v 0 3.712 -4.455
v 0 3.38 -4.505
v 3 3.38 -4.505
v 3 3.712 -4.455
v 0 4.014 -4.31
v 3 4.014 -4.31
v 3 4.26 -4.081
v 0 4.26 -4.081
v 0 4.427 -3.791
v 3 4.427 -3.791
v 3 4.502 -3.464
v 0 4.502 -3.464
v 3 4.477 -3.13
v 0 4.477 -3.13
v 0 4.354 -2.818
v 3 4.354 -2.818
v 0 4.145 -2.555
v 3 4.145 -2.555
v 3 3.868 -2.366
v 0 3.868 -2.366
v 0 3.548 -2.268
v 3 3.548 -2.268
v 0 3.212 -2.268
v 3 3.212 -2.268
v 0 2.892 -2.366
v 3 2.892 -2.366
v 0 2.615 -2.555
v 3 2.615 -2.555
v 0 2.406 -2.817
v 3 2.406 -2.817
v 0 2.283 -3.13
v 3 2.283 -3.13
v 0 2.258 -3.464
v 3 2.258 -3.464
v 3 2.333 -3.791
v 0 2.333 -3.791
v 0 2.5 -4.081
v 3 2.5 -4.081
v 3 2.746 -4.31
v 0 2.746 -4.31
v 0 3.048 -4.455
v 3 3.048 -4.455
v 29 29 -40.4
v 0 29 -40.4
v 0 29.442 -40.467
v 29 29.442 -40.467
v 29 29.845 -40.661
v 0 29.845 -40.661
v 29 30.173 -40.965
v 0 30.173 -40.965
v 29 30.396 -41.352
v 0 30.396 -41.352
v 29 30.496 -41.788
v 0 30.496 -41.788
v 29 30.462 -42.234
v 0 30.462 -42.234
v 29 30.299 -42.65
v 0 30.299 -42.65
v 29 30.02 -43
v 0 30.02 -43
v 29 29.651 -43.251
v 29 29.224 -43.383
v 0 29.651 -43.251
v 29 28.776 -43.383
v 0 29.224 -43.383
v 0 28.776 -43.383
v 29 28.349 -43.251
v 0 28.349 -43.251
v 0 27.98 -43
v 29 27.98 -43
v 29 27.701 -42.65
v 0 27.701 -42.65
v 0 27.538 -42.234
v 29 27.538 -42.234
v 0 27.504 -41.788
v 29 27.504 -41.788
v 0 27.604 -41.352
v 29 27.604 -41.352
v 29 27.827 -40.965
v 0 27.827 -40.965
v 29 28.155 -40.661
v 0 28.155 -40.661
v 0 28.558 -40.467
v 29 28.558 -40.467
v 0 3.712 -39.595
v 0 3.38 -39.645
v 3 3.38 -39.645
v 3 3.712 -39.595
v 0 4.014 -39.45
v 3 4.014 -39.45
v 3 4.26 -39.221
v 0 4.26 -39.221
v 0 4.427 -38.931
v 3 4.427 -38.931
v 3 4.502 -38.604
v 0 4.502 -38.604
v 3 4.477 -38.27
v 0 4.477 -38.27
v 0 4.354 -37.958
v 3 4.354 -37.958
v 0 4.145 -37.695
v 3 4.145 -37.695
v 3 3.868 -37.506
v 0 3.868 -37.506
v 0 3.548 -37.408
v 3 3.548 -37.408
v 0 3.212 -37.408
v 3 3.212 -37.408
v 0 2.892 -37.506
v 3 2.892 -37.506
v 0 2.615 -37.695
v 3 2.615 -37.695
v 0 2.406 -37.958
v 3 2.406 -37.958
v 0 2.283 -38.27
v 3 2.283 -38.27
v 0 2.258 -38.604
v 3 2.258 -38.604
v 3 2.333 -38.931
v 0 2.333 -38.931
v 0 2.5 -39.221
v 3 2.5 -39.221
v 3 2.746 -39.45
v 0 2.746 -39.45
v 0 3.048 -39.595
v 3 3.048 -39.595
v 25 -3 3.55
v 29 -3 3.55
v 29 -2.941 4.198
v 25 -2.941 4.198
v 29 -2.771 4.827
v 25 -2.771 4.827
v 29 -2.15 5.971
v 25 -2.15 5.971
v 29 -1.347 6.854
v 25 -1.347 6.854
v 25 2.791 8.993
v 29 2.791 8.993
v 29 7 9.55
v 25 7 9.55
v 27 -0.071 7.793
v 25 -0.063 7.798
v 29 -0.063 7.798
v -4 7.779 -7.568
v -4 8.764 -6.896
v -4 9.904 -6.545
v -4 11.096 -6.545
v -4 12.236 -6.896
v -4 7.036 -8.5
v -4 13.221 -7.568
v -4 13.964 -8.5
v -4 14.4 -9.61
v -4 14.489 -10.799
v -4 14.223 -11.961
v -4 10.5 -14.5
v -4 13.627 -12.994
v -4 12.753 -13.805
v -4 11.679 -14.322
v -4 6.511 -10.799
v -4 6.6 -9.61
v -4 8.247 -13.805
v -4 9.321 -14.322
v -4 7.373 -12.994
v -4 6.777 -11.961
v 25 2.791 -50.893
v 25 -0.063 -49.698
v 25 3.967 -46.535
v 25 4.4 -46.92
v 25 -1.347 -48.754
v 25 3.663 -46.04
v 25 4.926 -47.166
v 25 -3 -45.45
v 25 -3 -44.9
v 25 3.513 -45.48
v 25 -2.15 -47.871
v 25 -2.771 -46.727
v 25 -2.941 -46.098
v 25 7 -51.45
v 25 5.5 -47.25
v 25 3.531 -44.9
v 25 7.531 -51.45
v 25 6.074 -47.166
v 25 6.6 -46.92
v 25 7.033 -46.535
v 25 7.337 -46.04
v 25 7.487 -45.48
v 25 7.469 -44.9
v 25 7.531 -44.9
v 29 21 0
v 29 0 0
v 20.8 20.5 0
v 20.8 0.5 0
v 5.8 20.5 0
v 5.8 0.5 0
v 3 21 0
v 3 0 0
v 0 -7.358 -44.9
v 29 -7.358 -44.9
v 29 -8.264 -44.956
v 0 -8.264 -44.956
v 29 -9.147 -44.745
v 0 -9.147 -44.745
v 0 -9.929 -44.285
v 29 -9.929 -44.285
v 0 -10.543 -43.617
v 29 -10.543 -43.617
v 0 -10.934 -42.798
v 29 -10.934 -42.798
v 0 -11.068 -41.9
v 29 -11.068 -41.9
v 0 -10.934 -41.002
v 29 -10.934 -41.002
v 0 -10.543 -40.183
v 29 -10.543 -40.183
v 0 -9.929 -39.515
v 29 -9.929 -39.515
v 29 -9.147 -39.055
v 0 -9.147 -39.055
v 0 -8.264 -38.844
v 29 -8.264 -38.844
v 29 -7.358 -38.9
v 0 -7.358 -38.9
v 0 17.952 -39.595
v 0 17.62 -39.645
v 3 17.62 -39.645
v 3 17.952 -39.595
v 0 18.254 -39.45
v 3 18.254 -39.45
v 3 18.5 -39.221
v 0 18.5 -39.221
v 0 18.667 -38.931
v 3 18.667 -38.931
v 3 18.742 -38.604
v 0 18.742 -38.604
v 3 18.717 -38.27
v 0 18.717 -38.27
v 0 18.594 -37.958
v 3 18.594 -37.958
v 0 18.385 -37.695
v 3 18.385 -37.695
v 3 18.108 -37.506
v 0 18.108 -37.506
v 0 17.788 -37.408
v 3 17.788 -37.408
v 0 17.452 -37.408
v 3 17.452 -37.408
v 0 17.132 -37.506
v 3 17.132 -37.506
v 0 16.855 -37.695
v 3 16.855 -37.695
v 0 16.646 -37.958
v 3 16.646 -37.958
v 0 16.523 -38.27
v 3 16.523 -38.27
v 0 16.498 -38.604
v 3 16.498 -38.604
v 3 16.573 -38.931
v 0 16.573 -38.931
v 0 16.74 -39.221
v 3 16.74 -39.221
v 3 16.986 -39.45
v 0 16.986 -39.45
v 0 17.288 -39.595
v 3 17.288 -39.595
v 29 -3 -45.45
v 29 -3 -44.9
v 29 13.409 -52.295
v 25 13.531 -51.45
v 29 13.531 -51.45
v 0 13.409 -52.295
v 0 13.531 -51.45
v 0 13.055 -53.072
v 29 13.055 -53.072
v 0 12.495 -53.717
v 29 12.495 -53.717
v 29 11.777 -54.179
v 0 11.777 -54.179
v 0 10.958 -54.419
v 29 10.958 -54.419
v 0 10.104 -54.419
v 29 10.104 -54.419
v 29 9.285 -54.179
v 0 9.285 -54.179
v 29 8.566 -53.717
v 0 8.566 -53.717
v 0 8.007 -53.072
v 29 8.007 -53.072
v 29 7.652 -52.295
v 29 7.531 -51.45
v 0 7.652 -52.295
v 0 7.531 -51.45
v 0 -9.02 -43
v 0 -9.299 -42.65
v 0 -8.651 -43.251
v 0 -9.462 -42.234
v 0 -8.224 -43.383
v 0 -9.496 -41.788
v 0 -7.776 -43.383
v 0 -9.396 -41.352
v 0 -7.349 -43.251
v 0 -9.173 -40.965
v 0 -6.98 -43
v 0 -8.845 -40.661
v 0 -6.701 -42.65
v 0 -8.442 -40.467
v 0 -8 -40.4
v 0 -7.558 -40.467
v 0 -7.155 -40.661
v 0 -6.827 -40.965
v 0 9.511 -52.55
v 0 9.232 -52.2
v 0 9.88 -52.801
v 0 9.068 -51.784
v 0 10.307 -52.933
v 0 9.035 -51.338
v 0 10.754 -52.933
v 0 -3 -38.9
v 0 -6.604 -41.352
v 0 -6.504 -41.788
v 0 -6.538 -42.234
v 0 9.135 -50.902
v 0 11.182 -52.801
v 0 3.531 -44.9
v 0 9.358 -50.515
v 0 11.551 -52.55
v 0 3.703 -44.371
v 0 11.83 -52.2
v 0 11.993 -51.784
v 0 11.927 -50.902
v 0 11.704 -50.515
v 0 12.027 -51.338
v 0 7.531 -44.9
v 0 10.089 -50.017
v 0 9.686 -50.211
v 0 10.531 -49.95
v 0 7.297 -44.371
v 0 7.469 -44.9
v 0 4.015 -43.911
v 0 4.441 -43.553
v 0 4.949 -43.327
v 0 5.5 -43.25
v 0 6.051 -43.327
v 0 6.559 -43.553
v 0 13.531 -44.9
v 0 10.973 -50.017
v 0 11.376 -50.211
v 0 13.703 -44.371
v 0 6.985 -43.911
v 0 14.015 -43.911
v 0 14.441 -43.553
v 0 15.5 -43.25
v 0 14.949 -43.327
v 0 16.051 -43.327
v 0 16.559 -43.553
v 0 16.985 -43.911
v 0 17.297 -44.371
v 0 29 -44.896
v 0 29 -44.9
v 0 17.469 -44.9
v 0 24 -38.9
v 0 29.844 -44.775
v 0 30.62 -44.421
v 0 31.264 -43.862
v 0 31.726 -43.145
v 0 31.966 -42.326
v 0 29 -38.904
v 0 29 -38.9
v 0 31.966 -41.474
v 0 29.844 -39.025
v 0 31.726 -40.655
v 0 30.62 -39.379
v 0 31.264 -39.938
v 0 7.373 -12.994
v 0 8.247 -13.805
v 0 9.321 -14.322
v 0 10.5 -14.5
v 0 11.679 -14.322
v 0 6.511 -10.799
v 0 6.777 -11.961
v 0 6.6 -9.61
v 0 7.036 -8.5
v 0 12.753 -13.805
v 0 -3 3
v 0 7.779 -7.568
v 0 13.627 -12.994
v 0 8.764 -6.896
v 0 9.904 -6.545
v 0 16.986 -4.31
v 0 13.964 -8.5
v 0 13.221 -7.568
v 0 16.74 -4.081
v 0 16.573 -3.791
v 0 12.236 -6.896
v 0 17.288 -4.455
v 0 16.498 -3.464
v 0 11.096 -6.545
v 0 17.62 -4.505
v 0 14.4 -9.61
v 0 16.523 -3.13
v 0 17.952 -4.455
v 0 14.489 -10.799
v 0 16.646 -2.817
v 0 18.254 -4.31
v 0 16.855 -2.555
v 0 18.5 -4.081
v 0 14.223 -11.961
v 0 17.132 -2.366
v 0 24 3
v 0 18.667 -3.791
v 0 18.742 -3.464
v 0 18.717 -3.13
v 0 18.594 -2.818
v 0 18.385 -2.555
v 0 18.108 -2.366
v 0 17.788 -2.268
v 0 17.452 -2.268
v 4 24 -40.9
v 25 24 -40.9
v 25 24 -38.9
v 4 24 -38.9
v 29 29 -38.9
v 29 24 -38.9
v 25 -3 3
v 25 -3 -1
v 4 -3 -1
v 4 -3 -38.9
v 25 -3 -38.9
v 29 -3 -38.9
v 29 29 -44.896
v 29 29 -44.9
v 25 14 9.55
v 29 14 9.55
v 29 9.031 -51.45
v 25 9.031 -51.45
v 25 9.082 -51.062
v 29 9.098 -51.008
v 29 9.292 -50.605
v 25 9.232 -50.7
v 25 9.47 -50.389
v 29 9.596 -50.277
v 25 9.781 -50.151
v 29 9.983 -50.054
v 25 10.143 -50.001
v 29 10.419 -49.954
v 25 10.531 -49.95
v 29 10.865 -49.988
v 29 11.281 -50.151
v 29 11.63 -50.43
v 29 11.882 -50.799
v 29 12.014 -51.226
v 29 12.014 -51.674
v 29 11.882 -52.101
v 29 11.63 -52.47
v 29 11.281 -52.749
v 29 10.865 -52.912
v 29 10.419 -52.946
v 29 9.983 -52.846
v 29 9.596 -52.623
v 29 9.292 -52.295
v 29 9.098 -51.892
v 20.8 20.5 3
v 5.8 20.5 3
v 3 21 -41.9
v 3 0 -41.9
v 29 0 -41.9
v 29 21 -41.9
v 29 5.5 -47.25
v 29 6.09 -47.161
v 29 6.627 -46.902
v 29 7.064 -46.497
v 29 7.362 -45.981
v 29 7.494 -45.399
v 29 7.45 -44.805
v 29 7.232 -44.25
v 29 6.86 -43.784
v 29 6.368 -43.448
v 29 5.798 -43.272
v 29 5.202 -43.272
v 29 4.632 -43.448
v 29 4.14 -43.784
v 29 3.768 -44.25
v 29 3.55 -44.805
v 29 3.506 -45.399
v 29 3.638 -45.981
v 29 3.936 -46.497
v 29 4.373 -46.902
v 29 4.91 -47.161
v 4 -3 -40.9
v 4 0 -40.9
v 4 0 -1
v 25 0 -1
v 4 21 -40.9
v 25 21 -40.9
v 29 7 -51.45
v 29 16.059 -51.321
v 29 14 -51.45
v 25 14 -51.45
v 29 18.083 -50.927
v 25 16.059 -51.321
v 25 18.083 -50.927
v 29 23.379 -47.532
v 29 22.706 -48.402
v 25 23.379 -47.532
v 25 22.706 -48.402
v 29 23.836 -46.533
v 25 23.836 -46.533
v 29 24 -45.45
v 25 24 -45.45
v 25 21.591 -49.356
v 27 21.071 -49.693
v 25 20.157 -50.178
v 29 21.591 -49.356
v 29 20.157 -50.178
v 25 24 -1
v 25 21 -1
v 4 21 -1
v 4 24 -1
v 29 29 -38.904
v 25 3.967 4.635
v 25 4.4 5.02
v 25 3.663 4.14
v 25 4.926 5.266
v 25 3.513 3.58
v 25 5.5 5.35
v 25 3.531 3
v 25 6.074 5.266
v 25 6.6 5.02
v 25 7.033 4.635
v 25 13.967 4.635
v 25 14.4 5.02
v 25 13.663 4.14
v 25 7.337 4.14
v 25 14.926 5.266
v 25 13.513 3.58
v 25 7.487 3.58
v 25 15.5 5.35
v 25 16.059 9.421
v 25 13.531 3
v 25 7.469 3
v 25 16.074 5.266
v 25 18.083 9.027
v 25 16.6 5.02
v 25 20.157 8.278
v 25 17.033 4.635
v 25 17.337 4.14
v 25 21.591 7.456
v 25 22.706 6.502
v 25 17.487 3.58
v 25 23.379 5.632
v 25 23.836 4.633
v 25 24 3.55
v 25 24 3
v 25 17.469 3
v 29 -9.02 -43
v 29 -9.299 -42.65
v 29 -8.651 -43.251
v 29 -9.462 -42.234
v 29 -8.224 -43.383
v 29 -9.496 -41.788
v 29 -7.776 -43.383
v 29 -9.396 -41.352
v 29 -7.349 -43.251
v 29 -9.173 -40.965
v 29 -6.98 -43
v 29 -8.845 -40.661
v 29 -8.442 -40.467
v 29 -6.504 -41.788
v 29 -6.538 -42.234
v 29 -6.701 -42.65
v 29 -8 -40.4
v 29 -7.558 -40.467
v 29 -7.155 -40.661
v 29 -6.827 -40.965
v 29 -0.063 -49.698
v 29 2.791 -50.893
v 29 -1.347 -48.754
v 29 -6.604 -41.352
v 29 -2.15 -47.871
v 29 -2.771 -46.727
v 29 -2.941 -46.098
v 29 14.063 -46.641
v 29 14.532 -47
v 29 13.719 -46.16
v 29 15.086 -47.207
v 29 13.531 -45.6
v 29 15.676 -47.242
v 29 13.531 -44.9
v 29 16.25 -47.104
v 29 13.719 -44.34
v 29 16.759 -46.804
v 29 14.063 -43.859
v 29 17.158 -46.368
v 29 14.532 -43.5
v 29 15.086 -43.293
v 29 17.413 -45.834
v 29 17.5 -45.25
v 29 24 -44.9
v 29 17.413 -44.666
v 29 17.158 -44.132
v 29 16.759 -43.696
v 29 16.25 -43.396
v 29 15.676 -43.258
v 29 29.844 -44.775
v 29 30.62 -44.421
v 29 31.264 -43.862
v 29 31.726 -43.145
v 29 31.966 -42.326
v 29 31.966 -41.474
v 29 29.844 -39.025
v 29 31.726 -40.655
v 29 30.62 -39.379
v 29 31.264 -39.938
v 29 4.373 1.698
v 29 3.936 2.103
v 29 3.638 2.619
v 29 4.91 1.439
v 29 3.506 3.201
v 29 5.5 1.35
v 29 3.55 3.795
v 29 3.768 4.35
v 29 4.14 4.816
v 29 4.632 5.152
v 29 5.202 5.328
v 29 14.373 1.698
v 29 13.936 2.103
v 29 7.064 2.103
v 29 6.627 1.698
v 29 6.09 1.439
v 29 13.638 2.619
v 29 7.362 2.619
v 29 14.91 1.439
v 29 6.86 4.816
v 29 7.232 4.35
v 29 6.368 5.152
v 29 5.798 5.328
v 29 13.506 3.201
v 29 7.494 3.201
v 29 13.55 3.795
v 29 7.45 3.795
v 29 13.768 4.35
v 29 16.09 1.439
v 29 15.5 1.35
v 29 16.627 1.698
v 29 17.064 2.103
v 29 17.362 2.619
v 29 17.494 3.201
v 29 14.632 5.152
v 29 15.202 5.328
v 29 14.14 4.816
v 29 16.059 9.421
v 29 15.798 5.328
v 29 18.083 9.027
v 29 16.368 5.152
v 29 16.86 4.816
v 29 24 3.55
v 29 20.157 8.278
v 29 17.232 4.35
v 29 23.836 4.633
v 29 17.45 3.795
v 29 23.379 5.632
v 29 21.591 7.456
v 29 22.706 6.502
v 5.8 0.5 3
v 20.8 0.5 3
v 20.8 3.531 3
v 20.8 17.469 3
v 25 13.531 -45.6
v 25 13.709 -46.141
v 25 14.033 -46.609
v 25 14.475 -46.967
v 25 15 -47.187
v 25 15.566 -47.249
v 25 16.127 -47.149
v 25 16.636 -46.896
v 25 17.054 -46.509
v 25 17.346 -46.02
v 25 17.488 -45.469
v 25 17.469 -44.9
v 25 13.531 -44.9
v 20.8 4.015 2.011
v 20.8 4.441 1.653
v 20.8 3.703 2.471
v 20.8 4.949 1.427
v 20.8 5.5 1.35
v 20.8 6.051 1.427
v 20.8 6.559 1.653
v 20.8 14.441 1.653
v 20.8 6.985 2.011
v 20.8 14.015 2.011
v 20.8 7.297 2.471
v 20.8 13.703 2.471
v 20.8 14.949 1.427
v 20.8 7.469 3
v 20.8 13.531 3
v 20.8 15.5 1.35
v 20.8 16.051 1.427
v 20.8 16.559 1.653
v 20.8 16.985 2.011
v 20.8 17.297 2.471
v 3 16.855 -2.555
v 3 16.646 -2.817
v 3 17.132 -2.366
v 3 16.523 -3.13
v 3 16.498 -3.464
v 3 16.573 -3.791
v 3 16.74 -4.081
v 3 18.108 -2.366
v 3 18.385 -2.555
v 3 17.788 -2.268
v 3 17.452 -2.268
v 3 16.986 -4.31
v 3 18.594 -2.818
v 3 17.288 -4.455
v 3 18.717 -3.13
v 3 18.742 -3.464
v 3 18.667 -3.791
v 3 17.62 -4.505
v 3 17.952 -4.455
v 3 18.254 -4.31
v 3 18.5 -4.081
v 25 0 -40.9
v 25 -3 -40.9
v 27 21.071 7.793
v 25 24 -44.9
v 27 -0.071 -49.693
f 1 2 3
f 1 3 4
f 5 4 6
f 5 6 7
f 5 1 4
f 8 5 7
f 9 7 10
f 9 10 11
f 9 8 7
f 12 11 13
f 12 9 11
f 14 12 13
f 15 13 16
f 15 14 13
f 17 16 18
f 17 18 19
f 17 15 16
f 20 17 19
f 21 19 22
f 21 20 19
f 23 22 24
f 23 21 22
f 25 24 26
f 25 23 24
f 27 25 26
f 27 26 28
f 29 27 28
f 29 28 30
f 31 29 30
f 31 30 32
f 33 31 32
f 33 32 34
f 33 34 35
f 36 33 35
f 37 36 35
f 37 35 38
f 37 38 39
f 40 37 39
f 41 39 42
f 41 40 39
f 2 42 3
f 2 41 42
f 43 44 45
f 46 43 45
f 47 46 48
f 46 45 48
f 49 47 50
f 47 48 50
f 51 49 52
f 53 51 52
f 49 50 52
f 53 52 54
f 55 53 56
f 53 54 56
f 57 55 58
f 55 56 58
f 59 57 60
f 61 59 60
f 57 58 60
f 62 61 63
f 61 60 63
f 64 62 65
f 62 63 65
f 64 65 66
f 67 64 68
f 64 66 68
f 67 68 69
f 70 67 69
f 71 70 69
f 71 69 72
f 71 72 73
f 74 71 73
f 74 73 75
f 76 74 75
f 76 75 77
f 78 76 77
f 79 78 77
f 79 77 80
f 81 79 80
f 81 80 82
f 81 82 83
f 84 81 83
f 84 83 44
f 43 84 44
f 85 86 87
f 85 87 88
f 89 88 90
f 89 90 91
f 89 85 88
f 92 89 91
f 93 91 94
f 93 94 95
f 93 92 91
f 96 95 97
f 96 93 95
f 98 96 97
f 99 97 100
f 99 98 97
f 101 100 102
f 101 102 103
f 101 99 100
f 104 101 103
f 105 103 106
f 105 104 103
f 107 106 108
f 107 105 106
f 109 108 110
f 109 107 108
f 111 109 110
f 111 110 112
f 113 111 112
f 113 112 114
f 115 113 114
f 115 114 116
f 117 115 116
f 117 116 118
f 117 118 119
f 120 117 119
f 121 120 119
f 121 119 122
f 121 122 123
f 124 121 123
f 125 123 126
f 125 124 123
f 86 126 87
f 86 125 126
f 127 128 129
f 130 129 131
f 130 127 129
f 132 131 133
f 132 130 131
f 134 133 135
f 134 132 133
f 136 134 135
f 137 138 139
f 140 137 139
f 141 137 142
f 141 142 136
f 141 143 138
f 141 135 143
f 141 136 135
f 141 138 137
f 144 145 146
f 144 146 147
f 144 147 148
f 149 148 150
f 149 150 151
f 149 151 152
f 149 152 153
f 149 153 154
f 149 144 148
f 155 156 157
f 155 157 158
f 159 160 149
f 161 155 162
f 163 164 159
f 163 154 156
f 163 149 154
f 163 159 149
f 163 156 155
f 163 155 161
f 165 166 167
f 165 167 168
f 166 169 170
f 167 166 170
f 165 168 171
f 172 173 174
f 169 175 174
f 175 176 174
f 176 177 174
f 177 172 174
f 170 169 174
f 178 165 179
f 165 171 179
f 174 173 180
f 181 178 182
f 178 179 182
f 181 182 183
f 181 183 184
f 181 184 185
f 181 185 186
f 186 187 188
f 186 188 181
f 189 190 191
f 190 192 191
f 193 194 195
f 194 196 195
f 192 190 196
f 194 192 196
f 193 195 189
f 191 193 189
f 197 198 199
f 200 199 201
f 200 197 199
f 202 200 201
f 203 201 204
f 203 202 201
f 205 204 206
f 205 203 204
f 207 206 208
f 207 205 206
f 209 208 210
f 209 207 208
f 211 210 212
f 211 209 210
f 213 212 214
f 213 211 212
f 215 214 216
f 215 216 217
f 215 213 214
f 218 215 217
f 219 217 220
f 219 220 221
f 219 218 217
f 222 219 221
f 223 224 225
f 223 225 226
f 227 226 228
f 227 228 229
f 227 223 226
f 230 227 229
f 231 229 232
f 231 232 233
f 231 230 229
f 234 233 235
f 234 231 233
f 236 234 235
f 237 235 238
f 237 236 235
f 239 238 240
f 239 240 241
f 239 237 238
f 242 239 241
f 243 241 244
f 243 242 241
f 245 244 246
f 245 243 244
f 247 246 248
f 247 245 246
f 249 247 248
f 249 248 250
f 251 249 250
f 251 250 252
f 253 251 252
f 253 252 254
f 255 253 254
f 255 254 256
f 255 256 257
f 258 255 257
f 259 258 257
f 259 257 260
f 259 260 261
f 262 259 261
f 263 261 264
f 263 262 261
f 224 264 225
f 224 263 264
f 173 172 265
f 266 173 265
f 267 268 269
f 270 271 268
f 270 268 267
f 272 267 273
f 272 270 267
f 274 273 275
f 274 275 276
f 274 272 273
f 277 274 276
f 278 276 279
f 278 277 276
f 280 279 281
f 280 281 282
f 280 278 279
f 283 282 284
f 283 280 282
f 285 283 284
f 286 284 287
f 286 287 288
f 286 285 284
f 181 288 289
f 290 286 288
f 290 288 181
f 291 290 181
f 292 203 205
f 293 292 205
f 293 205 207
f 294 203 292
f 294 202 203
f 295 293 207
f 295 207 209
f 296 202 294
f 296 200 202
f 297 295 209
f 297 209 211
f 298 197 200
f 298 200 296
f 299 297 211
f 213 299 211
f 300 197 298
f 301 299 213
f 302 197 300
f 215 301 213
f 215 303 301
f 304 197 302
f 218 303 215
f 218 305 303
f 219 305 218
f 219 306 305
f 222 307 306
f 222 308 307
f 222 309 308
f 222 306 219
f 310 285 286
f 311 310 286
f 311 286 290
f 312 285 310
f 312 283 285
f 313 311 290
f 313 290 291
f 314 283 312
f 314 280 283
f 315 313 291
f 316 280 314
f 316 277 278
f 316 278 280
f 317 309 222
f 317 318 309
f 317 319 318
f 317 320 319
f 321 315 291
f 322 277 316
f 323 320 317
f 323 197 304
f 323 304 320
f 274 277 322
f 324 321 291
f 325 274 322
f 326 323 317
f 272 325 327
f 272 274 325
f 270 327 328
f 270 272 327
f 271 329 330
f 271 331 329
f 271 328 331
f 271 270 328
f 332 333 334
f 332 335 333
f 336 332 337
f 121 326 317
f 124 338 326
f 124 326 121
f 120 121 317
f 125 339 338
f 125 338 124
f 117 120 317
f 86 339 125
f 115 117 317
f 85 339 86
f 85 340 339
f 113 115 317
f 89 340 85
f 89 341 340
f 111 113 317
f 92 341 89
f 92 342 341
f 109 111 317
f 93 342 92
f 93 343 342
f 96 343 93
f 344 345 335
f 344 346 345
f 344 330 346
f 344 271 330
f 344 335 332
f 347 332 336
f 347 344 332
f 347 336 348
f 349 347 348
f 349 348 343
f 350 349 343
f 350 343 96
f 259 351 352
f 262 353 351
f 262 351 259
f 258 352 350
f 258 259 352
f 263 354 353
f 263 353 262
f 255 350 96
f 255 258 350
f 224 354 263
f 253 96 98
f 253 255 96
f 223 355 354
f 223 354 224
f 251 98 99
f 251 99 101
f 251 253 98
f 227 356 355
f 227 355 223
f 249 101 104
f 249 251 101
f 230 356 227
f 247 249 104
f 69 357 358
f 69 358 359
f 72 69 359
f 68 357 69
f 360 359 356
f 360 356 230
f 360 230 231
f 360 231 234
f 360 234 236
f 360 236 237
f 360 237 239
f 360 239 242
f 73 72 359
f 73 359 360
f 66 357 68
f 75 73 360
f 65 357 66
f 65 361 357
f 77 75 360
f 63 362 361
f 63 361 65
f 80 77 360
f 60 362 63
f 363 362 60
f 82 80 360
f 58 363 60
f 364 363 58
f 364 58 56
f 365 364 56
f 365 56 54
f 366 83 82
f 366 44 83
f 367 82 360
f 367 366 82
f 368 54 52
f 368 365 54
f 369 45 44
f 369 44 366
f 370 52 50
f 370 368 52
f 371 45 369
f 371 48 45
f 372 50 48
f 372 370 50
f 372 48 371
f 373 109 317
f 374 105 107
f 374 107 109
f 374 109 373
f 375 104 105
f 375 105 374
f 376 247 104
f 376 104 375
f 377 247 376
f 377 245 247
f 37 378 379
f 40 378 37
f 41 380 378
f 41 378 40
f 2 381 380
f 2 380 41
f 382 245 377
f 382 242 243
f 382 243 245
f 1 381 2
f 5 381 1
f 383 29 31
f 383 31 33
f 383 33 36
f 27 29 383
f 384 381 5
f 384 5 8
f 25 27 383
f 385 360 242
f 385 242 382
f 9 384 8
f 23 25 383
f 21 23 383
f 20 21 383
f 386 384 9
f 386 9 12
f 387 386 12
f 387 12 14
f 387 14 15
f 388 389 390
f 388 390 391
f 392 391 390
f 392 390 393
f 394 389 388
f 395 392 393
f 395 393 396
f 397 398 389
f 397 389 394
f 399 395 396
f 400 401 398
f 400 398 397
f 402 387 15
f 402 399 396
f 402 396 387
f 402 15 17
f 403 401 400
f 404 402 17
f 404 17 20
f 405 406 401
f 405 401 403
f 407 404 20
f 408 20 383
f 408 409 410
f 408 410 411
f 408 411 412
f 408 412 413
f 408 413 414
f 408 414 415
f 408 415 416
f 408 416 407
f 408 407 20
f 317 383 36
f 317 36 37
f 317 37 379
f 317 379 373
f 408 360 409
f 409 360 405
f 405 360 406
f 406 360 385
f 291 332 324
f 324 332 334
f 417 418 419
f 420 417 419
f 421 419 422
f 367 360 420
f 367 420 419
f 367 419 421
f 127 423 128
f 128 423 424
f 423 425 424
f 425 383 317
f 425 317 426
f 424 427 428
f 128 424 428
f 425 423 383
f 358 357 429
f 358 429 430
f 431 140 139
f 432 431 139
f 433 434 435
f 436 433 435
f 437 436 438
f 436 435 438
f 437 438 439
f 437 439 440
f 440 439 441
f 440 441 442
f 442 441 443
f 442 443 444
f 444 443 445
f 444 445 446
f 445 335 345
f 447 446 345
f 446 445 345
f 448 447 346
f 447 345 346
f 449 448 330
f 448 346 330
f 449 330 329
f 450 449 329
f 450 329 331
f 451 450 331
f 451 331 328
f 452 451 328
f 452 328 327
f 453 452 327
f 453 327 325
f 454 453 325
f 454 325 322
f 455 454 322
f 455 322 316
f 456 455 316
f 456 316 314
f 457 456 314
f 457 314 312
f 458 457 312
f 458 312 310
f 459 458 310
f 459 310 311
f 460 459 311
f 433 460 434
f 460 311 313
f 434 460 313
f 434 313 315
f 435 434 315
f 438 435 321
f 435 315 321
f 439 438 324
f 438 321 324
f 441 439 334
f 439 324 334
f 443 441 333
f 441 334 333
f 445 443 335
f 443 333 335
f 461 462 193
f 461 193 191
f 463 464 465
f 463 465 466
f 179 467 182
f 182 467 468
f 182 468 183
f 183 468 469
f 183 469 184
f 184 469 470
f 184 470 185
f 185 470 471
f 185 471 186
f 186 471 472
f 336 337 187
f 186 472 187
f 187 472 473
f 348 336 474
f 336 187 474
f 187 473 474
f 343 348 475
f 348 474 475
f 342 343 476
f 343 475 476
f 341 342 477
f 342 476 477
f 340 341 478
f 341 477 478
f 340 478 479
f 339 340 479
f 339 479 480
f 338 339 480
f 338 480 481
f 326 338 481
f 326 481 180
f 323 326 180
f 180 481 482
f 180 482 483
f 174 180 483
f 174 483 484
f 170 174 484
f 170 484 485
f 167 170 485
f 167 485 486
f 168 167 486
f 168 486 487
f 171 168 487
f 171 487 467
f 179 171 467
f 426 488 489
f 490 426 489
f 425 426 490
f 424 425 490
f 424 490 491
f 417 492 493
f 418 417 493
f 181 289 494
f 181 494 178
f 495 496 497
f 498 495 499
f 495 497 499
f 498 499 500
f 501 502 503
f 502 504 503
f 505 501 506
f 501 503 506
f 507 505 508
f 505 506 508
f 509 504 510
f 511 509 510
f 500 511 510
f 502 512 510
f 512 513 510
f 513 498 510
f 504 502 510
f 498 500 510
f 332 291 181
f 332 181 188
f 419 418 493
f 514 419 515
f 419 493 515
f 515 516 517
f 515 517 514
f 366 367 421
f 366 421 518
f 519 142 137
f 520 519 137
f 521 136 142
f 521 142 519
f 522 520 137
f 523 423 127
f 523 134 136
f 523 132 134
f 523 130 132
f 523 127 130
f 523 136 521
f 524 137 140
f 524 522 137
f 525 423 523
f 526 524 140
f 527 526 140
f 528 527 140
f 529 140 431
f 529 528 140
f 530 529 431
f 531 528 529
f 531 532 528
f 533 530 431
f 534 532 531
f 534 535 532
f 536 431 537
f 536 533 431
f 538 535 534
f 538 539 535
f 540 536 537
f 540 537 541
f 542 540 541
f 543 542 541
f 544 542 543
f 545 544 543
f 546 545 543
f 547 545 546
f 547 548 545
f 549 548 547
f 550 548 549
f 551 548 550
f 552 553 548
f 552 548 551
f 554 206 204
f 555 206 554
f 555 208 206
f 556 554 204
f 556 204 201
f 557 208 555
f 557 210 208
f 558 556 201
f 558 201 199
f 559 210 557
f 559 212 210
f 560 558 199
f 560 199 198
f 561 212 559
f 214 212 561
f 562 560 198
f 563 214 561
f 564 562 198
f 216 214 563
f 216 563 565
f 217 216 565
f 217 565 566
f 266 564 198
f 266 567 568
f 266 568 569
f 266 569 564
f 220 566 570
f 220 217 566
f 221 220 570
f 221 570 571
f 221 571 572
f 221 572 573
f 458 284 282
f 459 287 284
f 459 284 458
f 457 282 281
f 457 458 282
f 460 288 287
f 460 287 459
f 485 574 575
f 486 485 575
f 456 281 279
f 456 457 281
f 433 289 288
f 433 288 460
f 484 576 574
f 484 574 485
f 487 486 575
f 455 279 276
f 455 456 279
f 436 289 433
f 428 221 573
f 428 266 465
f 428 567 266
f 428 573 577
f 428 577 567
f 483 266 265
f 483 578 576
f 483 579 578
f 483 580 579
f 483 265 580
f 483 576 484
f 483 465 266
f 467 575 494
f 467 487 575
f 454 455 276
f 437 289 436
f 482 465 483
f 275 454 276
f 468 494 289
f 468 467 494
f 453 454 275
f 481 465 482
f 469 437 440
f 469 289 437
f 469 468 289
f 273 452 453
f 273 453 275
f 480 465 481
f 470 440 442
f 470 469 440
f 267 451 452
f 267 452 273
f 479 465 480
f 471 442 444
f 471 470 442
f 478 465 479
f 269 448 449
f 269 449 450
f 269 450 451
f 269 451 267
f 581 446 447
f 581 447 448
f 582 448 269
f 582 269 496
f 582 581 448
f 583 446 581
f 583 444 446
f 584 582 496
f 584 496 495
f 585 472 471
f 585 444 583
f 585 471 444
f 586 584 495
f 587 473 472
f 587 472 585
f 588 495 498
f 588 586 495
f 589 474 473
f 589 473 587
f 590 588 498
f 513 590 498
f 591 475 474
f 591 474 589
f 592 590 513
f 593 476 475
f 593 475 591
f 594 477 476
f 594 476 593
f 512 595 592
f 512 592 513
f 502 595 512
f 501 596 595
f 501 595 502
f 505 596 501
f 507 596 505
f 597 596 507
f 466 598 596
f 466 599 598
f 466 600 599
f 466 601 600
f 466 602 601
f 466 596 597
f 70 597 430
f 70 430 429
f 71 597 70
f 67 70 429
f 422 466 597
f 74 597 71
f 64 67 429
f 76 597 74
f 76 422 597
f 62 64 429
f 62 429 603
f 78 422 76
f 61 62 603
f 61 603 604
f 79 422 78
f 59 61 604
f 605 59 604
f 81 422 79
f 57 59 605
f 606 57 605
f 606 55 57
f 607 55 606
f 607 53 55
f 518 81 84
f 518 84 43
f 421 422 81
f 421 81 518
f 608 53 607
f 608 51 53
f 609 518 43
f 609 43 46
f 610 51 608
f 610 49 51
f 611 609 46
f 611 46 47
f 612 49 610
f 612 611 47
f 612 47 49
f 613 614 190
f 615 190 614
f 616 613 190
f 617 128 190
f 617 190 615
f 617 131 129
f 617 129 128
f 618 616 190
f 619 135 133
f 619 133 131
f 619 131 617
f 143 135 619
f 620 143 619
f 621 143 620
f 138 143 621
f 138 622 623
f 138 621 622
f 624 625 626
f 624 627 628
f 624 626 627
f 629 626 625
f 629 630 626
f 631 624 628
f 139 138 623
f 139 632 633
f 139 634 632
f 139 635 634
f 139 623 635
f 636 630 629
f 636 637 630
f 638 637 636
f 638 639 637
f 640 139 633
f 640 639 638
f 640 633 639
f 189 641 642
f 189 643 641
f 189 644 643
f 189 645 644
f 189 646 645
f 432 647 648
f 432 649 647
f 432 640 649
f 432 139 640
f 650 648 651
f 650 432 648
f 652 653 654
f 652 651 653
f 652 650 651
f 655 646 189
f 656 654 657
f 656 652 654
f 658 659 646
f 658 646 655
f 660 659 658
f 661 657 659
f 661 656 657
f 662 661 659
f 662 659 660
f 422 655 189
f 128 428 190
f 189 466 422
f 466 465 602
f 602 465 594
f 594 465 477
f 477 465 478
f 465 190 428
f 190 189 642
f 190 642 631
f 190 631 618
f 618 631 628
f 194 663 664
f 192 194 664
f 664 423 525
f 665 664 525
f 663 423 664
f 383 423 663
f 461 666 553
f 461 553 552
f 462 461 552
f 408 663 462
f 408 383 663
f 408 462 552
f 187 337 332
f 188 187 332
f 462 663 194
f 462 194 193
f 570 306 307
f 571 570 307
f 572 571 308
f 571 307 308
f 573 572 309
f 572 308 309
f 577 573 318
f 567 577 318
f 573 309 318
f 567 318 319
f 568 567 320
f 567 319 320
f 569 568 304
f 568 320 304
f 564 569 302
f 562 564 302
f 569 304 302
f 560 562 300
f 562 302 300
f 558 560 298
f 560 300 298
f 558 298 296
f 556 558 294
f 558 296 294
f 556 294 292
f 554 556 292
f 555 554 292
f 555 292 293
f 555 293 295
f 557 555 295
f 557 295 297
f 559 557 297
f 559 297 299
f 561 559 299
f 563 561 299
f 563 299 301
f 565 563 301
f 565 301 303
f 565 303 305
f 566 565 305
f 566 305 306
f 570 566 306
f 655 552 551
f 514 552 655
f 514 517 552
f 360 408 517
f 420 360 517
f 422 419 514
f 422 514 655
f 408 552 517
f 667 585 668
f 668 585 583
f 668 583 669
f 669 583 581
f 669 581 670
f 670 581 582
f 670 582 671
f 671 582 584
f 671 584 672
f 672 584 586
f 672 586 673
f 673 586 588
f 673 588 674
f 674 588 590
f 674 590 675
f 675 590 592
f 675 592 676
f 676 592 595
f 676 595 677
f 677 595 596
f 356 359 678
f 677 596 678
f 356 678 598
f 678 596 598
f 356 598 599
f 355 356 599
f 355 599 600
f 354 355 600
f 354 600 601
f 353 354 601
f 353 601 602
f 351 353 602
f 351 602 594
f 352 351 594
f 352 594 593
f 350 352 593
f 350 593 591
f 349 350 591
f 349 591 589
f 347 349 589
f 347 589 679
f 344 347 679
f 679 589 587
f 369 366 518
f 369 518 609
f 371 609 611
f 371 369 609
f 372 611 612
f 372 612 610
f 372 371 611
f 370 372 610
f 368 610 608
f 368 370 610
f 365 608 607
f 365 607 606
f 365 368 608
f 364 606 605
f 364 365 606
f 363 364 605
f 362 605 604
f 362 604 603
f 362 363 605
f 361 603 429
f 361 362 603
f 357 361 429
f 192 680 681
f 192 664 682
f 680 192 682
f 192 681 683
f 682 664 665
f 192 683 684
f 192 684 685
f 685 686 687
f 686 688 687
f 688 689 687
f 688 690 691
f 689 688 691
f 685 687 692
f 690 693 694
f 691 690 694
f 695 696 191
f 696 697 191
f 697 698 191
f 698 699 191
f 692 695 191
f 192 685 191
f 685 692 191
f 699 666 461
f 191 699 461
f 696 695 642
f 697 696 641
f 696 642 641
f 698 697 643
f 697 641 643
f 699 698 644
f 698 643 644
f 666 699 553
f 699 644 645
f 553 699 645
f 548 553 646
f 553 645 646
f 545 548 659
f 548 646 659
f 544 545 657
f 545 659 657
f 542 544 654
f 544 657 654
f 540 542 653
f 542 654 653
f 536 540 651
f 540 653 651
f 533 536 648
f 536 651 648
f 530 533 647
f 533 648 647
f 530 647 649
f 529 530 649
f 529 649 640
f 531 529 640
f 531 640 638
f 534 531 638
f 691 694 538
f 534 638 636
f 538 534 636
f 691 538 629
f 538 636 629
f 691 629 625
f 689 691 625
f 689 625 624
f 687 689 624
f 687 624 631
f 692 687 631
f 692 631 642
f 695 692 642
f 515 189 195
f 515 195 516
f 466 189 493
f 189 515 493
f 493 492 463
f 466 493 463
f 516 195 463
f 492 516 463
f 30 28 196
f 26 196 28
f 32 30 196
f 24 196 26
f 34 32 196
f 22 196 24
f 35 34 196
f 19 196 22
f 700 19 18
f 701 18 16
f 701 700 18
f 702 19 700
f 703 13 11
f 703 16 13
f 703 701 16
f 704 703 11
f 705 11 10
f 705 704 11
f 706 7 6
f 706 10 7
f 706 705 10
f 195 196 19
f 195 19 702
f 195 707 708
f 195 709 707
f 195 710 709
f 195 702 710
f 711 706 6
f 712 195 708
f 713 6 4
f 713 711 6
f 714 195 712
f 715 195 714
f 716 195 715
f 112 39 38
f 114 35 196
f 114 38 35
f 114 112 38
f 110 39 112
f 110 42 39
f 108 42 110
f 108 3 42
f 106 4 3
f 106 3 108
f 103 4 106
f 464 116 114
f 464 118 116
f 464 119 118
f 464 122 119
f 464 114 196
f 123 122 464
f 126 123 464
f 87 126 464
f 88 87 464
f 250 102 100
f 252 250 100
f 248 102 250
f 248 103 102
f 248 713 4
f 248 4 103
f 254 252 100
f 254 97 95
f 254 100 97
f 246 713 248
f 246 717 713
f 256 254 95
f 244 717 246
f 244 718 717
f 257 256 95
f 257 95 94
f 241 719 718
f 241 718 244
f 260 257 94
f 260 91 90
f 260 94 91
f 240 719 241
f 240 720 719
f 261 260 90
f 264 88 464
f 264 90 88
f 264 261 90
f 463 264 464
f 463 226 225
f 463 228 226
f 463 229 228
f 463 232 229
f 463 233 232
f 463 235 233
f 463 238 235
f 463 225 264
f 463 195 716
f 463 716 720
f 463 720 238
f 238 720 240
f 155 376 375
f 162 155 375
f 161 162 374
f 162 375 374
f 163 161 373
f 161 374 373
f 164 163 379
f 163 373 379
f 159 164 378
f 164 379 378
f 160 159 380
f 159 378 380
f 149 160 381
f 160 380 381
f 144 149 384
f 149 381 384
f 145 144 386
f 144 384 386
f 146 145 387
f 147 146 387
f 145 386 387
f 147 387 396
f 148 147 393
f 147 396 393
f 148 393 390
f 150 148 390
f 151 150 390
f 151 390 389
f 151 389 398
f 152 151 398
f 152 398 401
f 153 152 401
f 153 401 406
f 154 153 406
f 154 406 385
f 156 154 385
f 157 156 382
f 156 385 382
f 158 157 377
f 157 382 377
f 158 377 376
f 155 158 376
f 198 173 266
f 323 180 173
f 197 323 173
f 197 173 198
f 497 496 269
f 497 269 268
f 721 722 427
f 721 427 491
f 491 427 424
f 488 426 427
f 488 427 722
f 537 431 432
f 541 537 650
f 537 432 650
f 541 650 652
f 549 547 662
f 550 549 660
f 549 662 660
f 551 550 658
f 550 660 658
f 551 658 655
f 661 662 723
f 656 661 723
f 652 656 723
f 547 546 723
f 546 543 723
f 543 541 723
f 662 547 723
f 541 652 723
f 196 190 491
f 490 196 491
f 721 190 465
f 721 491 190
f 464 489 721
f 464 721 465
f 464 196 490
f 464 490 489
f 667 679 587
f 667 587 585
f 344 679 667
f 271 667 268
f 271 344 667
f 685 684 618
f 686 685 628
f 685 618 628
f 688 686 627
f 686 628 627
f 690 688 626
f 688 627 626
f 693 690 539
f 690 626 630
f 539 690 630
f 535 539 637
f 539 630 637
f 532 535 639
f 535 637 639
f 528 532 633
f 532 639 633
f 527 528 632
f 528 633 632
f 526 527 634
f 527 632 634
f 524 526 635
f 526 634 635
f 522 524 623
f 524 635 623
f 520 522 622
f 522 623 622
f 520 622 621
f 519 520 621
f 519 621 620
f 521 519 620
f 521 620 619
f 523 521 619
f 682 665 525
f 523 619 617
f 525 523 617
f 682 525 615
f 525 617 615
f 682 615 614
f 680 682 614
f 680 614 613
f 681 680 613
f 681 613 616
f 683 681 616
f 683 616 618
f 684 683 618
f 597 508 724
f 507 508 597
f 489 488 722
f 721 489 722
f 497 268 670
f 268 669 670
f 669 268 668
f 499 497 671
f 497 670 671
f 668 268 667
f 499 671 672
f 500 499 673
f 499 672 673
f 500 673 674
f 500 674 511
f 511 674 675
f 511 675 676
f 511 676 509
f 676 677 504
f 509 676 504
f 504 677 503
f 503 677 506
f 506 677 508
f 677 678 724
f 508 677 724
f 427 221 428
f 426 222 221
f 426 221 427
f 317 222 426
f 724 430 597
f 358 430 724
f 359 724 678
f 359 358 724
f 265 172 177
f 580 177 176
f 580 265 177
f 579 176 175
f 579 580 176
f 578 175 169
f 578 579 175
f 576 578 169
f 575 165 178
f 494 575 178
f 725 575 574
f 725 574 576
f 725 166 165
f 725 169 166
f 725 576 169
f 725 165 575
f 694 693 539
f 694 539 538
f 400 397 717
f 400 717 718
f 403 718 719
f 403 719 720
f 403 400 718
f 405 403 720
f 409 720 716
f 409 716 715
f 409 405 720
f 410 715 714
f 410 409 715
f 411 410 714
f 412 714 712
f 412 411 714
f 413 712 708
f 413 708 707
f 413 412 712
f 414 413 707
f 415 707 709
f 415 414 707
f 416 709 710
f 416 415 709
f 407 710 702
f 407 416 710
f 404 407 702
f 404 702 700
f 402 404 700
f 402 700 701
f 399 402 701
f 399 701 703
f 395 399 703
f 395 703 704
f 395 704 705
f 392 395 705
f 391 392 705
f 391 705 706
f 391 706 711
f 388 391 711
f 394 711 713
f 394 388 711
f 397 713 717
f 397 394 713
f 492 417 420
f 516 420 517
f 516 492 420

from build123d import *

# Parameters (mm, degrees)
SKETCH1_W            = 41.9
SKETCH1_H            = 21
SKETCH1_R            = 1.125
BOSS_EXTRUDE1_DEPTH  = 3
SKETCH1_3_W          = 47.9
SKETCH1_3_H          = 27
SKETCH1_3_W_2        = 41.9
SKETCH1_3_H_2        = 21
BOSS_EXTRUDE2_DEPTH  = 29
CUT_EXTRUDE1_REACH   = 62.921
SKETCH2_W            = 15
SKETCH2_H            = 20
SKETCH4_W            = 21
SKETCH4_H            = 39.9
CUT_EXTRUDE2_DEPTH   = 35
SKETCH5_R            = 4
BOSS_EXTRUDE3_DEPTH  = 4
SKETCH6_W            = 4
SKETCH6_H            = 27
BOSS_EXTRUDE4_DEPTH  = 6.55
SKETCH7_W            = 4
SKETCH7_H            = 27
BOSS_EXTRUDE5_DEPTH  = 6.55
CUT_EXTRUDE3_REACH   = 67.667
SKETCH10_R           = 2
BOSS_EXTRUDE10_REACH = 65.75
SKETCH11_R           = 1.5
FILLET3_SIZE         = 10
FILLET3_SIZE_2       = 6
CUT_EXTRUDE4_REACH   = 73.257
SKETCH12_R           = 1.5


with BuildPart() as part:
    # Sketch1 → Boss-Extrude1 (new body)
    with BuildSketch(Plane(origin=(0, 0, 0), x_dir=(0, 0, -1), z_dir=(1, 0, 0))):
        with Locations((20.95, 10.5)):
            Rectangle(SKETCH1_W, SKETCH1_H)
        with Locations((38.52, 17.62)):
            Circle(SKETCH1_R, mode=Mode.SUBTRACT)
        with Locations((38.52, 3.38)):
            Circle(SKETCH1_R, mode=Mode.SUBTRACT)
        with Locations((3.38, 17.62)):
            Circle(SKETCH1_R, mode=Mode.SUBTRACT)
        with Locations((3.38, 3.38)):
            Circle(SKETCH1_R, mode=Mode.SUBTRACT)
    extrude(amount=BOSS_EXTRUDE1_DEPTH)

    # Sketch1<3> → Boss-Extrude2 (add)
    with BuildSketch(Plane(origin=(0, 0, 0), x_dir=(0, 0, -1), z_dir=(1, 0, 0))):
        with Locations((20.95, 10.5)):
            Rectangle(SKETCH1_3_W, SKETCH1_3_H)
        with Locations((20.95, 10.5)):
            Rectangle(SKETCH1_3_W_2, SKETCH1_3_H_2, mode=Mode.SUBTRACT)
    extrude(amount=BOSS_EXTRUDE2_DEPTH)

    # Sketch2 → Cut-Extrude1 (cut, up to next)
    with BuildSketch(Plane.XY.offset(3), mode=Mode.PRIVATE) as cut_extrude1_sk1:
        with Locations((13.3, 10.5)):
            Rectangle(SKETCH2_W, SKETCH2_H)
    cut_extrude1_tool1 = extrude(cut_extrude1_sk1.sketch, amount=-CUT_EXTRUDE1_REACH, mode=Mode.PRIVATE) & part.part
    add(cut_extrude1_tool1.solids().sort_by_distance((13.3, 10.5, 3))[0], mode=Mode.SUBTRACT)

    # Sketch4 → Cut-Extrude2 (cut)
    with BuildSketch(Plane.XZ.offset(3)):
        with Locations((14.5, -20.95)):
            Rectangle(SKETCH4_W, SKETCH4_H)
    extrude(amount=-CUT_EXTRUDE2_DEPTH, mode=Mode.SUBTRACT)

    # Sketch5 → Boss-Extrude3 (add)
    with BuildSketch(Plane.ZY):
        with Locations(Location((-10.5, 10.5, 0), (0, 0, 180))):
            Circle(SKETCH5_R)
    extrude(amount=BOSS_EXTRUDE3_DEPTH)

    # Sketch6 → Boss-Extrude4 (add)
    with BuildSketch(Plane(origin=(0, 0, -44.9), x_dir=(-1, 0, 0), z_dir=(0, 0, -1))):
        with Locations((-27, 10.5)):
            Rectangle(SKETCH6_W, SKETCH6_H)
    extrude(amount=BOSS_EXTRUDE4_DEPTH)

    # Sketch7 → Boss-Extrude5 (add)
    with BuildSketch(Plane.XY.offset(3)):
        with Locations((27, 10.5)):
            Rectangle(SKETCH7_W, SKETCH7_H)
    extrude(amount=BOSS_EXTRUDE5_DEPTH)

    # Sketch10 → Cut-Extrude3 (cut, up to next)
    with BuildSketch(Plane(origin=(29, 0, 0), x_dir=(0, 0, -1), z_dir=(1, 0, 0)), mode=Mode.PRIVATE) as cut_extrude3_sk1:
        with Locations((-3.35, 15.5)):
            Circle(SKETCH10_R)
    cut_extrude3_tool1 = extrude(cut_extrude3_sk1.sketch, amount=-CUT_EXTRUDE3_REACH, mode=Mode.PRIVATE) & part.part
    # Sketch10 → Cut-Extrude3 (cut, up to next)
    with BuildSketch(Plane(origin=(29, 0, 0), x_dir=(0, 0, -1), z_dir=(1, 0, 0)), mode=Mode.PRIVATE) as cut_extrude3_sk2:
        with Locations((-3.35, 5.5)):
            Circle(SKETCH10_R)
    cut_extrude3_tool2 = extrude(cut_extrude3_sk2.sketch, amount=-CUT_EXTRUDE3_REACH, mode=Mode.PRIVATE) & part.part
    # Sketch10 → Cut-Extrude3 (cut, up to next)
    with BuildSketch(Plane(origin=(29, 0, 0), x_dir=(0, 0, -1), z_dir=(1, 0, 0)), mode=Mode.PRIVATE) as cut_extrude3_sk3:
        with Locations((45.25, 5.5)):
            Circle(SKETCH10_R)
    cut_extrude3_tool3 = extrude(cut_extrude3_sk3.sketch, amount=-CUT_EXTRUDE3_REACH, mode=Mode.PRIVATE) & part.part
    # Sketch10 → Cut-Extrude3 (cut, up to next)
    with BuildSketch(Plane(origin=(29, 0, 0), x_dir=(0, 0, -1), z_dir=(1, 0, 0)), mode=Mode.PRIVATE) as cut_extrude3_sk4:
        with Locations((45.25, 15.5)):
            Circle(SKETCH10_R)
    cut_extrude3_tool4 = extrude(cut_extrude3_sk4.sketch, amount=-CUT_EXTRUDE3_REACH, mode=Mode.PRIVATE) & part.part
    add(cut_extrude3_tool1.solids().sort_by_distance((29, 15.5, 3.35))[0], mode=Mode.SUBTRACT)
    add(cut_extrude3_tool2.solids().sort_by_distance((29, 5.5, 3.35))[0], mode=Mode.SUBTRACT)
    add(cut_extrude3_tool3.solids().sort_by_distance((29, 5.5, -45.25))[0], mode=Mode.SUBTRACT)
    add(cut_extrude3_tool4.solids().sort_by_distance((29, 15.5, -45.25))[0], mode=Mode.SUBTRACT)

    # Boss-Extrude10: up to this face of the body (flat: up to its plane)
    boss_extrude10_end = Plane(part.part.faces().sort_by_distance((29, 10.5, -50.782916797))[0])
    # Sketch11 → Boss-Extrude10 (add, up to the picked face)
    with BuildSketch(Plane.ZY, mode=Mode.PRIVATE) as boss_extrude10_sk1:
        with BuildLine():
            Line((-44.9, 29), (-44.9, 24))
            Line((-44.9, 24), (-38.9, 24))
            Line((-38.9, 24), (-38.9, 29))
            Line((-38.9, 29), (-38.903642649, 29))
            ThreePointArc((-38.903642649, 29), (-41.9, 31.996357351), (-44.896357351, 29))
            Line((-44.896357351, 29), (-44.9, 29))
        make_face()
        with Locations((-41.9, 29)):
            Circle(SKETCH11_R, mode=Mode.SUBTRACT)
    boss_extrude10_tool1 = split(extrude(boss_extrude10_sk1.sketch, amount=-BOSS_EXTRUDE10_REACH, mode=Mode.PRIVATE), bisect_by=boss_extrude10_end, keep=Keep.BOTH, mode=Mode.PRIVATE)
    # Sketch11 → Boss-Extrude10 (add, up to the picked face)
    with BuildSketch(Plane.ZY, mode=Mode.PRIVATE) as boss_extrude10_sk2:
        with BuildLine():
            Line((-44.9, 7.530863133), (-44.9, 13.530863133))
            Line((-44.9, 13.530863133), (-51.45, 13.530863133))
            ThreePointArc((-51.45, 13.530863133), (-54.45, 10.530863133), (-51.45, 7.530863133))
            Line((-51.45, 7.530863133), (-44.9, 7.530863133))
        make_face()
        with Locations((-51.45, 10.530863133)):
            Circle(SKETCH11_R, mode=Mode.SUBTRACT)
    boss_extrude10_tool2 = split(extrude(boss_extrude10_sk2.sketch, amount=-BOSS_EXTRUDE10_REACH, mode=Mode.PRIVATE), bisect_by=boss_extrude10_end, keep=Keep.BOTH, mode=Mode.PRIVATE)
    # Sketch11 → Boss-Extrude10 (add, up to the picked face)
    with BuildSketch(Plane.ZY, mode=Mode.PRIVATE) as boss_extrude10_sk3:
        with BuildLine():
            Line((-38.9, -3), (-44.9, -3))
            Line((-44.9, -3), (-44.9, -7.358406619))
            ThreePointArc((-44.9, -7.358406619), (-41.9, -11.067839968), (-38.9, -7.358406619))
            Line((-38.9, -7.358406619), (-38.9, -3))
        make_face()
        with Locations((-41.9, -8)):
            Circle(SKETCH11_R, mode=Mode.SUBTRACT)
    boss_extrude10_tool3 = split(extrude(boss_extrude10_sk3.sketch, amount=-BOSS_EXTRUDE10_REACH, mode=Mode.PRIVATE), bisect_by=boss_extrude10_end, keep=Keep.BOTH, mode=Mode.PRIVATE)
    add(boss_extrude10_tool1.solids().sort_by(Axis((0, 27.459117, -41.9), (1, 0, 0)))[0])
    add(boss_extrude10_tool2.solids().sort_by(Axis((0, 10.530863, -49.062446), (1, 0, 0)))[0])
    add(boss_extrude10_tool3.solids().sort_by(Axis((0, -5.179203, -39.001359), (1, 0, 0)))[0])

    # Fillet3
    # an asymmetric fillet: 10, 6 mm, written as the material it takes off along each edge
    with BuildSketch(Plane(origin=(54, 24, 9.55), x_dir=(0, -1, 0), z_dir=(-1, 0, 0)), Plane(origin=(0, 24, -51.45), x_dir=(0, -1, 0), z_dir=(1, 0, 0))) as fillet3_piece_1:
        with BuildLine():
            Bezier((FILLET3_SIZE, 0), (0, 0), (0, -FILLET3_SIZE_2), weights=[1, 0.707106781, 1])
            Line((0, -FILLET3_SIZE_2), (0, 0))
            Line((0, 0), (FILLET3_SIZE, 0))
        make_face()
    extrude(amount=54, mode=Mode.SUBTRACT)
    with BuildSketch(Plane(origin=(0, -3, 9.55), x_dir=(0, 0, -1), z_dir=(1, 0, 0)), Plane(origin=(54, -3, -51.45), x_dir=(0, 0, 1), z_dir=(-1, 0, 0))) as fillet3_piece_2:
        with BuildLine():
            Bezier((FILLET3_SIZE_2, 0), (0, 0), (0, FILLET3_SIZE), weights=[1, 0.707106781, 1])
            Line((0, FILLET3_SIZE), (0, 0))
            Line((0, 0), (FILLET3_SIZE_2, 0))
        make_face()
    extrude(amount=54, mode=Mode.SUBTRACT)

    # Sketch12 → Cut-Extrude4 (cut, up to next)
    with BuildSketch(Plane(origin=(29, 0, 0), x_dir=(0, 0, -1), z_dir=(1, 0, 0)), mode=Mode.PRIVATE) as cut_extrude4_sk1:
        with Locations(Location((51.45, 10.530863133, 0), (0, 0, 180))):
            Circle(SKETCH12_R)
    cut_extrude4_tool1 = extrude(cut_extrude4_sk1.sketch, amount=-CUT_EXTRUDE4_REACH, mode=Mode.PRIVATE) & part.part
    add(cut_extrude4_tool1.solids().sort_by_distance((29, 10.530863, -51.45))[0], mode=Mode.SUBTRACT)


solid = part.part
